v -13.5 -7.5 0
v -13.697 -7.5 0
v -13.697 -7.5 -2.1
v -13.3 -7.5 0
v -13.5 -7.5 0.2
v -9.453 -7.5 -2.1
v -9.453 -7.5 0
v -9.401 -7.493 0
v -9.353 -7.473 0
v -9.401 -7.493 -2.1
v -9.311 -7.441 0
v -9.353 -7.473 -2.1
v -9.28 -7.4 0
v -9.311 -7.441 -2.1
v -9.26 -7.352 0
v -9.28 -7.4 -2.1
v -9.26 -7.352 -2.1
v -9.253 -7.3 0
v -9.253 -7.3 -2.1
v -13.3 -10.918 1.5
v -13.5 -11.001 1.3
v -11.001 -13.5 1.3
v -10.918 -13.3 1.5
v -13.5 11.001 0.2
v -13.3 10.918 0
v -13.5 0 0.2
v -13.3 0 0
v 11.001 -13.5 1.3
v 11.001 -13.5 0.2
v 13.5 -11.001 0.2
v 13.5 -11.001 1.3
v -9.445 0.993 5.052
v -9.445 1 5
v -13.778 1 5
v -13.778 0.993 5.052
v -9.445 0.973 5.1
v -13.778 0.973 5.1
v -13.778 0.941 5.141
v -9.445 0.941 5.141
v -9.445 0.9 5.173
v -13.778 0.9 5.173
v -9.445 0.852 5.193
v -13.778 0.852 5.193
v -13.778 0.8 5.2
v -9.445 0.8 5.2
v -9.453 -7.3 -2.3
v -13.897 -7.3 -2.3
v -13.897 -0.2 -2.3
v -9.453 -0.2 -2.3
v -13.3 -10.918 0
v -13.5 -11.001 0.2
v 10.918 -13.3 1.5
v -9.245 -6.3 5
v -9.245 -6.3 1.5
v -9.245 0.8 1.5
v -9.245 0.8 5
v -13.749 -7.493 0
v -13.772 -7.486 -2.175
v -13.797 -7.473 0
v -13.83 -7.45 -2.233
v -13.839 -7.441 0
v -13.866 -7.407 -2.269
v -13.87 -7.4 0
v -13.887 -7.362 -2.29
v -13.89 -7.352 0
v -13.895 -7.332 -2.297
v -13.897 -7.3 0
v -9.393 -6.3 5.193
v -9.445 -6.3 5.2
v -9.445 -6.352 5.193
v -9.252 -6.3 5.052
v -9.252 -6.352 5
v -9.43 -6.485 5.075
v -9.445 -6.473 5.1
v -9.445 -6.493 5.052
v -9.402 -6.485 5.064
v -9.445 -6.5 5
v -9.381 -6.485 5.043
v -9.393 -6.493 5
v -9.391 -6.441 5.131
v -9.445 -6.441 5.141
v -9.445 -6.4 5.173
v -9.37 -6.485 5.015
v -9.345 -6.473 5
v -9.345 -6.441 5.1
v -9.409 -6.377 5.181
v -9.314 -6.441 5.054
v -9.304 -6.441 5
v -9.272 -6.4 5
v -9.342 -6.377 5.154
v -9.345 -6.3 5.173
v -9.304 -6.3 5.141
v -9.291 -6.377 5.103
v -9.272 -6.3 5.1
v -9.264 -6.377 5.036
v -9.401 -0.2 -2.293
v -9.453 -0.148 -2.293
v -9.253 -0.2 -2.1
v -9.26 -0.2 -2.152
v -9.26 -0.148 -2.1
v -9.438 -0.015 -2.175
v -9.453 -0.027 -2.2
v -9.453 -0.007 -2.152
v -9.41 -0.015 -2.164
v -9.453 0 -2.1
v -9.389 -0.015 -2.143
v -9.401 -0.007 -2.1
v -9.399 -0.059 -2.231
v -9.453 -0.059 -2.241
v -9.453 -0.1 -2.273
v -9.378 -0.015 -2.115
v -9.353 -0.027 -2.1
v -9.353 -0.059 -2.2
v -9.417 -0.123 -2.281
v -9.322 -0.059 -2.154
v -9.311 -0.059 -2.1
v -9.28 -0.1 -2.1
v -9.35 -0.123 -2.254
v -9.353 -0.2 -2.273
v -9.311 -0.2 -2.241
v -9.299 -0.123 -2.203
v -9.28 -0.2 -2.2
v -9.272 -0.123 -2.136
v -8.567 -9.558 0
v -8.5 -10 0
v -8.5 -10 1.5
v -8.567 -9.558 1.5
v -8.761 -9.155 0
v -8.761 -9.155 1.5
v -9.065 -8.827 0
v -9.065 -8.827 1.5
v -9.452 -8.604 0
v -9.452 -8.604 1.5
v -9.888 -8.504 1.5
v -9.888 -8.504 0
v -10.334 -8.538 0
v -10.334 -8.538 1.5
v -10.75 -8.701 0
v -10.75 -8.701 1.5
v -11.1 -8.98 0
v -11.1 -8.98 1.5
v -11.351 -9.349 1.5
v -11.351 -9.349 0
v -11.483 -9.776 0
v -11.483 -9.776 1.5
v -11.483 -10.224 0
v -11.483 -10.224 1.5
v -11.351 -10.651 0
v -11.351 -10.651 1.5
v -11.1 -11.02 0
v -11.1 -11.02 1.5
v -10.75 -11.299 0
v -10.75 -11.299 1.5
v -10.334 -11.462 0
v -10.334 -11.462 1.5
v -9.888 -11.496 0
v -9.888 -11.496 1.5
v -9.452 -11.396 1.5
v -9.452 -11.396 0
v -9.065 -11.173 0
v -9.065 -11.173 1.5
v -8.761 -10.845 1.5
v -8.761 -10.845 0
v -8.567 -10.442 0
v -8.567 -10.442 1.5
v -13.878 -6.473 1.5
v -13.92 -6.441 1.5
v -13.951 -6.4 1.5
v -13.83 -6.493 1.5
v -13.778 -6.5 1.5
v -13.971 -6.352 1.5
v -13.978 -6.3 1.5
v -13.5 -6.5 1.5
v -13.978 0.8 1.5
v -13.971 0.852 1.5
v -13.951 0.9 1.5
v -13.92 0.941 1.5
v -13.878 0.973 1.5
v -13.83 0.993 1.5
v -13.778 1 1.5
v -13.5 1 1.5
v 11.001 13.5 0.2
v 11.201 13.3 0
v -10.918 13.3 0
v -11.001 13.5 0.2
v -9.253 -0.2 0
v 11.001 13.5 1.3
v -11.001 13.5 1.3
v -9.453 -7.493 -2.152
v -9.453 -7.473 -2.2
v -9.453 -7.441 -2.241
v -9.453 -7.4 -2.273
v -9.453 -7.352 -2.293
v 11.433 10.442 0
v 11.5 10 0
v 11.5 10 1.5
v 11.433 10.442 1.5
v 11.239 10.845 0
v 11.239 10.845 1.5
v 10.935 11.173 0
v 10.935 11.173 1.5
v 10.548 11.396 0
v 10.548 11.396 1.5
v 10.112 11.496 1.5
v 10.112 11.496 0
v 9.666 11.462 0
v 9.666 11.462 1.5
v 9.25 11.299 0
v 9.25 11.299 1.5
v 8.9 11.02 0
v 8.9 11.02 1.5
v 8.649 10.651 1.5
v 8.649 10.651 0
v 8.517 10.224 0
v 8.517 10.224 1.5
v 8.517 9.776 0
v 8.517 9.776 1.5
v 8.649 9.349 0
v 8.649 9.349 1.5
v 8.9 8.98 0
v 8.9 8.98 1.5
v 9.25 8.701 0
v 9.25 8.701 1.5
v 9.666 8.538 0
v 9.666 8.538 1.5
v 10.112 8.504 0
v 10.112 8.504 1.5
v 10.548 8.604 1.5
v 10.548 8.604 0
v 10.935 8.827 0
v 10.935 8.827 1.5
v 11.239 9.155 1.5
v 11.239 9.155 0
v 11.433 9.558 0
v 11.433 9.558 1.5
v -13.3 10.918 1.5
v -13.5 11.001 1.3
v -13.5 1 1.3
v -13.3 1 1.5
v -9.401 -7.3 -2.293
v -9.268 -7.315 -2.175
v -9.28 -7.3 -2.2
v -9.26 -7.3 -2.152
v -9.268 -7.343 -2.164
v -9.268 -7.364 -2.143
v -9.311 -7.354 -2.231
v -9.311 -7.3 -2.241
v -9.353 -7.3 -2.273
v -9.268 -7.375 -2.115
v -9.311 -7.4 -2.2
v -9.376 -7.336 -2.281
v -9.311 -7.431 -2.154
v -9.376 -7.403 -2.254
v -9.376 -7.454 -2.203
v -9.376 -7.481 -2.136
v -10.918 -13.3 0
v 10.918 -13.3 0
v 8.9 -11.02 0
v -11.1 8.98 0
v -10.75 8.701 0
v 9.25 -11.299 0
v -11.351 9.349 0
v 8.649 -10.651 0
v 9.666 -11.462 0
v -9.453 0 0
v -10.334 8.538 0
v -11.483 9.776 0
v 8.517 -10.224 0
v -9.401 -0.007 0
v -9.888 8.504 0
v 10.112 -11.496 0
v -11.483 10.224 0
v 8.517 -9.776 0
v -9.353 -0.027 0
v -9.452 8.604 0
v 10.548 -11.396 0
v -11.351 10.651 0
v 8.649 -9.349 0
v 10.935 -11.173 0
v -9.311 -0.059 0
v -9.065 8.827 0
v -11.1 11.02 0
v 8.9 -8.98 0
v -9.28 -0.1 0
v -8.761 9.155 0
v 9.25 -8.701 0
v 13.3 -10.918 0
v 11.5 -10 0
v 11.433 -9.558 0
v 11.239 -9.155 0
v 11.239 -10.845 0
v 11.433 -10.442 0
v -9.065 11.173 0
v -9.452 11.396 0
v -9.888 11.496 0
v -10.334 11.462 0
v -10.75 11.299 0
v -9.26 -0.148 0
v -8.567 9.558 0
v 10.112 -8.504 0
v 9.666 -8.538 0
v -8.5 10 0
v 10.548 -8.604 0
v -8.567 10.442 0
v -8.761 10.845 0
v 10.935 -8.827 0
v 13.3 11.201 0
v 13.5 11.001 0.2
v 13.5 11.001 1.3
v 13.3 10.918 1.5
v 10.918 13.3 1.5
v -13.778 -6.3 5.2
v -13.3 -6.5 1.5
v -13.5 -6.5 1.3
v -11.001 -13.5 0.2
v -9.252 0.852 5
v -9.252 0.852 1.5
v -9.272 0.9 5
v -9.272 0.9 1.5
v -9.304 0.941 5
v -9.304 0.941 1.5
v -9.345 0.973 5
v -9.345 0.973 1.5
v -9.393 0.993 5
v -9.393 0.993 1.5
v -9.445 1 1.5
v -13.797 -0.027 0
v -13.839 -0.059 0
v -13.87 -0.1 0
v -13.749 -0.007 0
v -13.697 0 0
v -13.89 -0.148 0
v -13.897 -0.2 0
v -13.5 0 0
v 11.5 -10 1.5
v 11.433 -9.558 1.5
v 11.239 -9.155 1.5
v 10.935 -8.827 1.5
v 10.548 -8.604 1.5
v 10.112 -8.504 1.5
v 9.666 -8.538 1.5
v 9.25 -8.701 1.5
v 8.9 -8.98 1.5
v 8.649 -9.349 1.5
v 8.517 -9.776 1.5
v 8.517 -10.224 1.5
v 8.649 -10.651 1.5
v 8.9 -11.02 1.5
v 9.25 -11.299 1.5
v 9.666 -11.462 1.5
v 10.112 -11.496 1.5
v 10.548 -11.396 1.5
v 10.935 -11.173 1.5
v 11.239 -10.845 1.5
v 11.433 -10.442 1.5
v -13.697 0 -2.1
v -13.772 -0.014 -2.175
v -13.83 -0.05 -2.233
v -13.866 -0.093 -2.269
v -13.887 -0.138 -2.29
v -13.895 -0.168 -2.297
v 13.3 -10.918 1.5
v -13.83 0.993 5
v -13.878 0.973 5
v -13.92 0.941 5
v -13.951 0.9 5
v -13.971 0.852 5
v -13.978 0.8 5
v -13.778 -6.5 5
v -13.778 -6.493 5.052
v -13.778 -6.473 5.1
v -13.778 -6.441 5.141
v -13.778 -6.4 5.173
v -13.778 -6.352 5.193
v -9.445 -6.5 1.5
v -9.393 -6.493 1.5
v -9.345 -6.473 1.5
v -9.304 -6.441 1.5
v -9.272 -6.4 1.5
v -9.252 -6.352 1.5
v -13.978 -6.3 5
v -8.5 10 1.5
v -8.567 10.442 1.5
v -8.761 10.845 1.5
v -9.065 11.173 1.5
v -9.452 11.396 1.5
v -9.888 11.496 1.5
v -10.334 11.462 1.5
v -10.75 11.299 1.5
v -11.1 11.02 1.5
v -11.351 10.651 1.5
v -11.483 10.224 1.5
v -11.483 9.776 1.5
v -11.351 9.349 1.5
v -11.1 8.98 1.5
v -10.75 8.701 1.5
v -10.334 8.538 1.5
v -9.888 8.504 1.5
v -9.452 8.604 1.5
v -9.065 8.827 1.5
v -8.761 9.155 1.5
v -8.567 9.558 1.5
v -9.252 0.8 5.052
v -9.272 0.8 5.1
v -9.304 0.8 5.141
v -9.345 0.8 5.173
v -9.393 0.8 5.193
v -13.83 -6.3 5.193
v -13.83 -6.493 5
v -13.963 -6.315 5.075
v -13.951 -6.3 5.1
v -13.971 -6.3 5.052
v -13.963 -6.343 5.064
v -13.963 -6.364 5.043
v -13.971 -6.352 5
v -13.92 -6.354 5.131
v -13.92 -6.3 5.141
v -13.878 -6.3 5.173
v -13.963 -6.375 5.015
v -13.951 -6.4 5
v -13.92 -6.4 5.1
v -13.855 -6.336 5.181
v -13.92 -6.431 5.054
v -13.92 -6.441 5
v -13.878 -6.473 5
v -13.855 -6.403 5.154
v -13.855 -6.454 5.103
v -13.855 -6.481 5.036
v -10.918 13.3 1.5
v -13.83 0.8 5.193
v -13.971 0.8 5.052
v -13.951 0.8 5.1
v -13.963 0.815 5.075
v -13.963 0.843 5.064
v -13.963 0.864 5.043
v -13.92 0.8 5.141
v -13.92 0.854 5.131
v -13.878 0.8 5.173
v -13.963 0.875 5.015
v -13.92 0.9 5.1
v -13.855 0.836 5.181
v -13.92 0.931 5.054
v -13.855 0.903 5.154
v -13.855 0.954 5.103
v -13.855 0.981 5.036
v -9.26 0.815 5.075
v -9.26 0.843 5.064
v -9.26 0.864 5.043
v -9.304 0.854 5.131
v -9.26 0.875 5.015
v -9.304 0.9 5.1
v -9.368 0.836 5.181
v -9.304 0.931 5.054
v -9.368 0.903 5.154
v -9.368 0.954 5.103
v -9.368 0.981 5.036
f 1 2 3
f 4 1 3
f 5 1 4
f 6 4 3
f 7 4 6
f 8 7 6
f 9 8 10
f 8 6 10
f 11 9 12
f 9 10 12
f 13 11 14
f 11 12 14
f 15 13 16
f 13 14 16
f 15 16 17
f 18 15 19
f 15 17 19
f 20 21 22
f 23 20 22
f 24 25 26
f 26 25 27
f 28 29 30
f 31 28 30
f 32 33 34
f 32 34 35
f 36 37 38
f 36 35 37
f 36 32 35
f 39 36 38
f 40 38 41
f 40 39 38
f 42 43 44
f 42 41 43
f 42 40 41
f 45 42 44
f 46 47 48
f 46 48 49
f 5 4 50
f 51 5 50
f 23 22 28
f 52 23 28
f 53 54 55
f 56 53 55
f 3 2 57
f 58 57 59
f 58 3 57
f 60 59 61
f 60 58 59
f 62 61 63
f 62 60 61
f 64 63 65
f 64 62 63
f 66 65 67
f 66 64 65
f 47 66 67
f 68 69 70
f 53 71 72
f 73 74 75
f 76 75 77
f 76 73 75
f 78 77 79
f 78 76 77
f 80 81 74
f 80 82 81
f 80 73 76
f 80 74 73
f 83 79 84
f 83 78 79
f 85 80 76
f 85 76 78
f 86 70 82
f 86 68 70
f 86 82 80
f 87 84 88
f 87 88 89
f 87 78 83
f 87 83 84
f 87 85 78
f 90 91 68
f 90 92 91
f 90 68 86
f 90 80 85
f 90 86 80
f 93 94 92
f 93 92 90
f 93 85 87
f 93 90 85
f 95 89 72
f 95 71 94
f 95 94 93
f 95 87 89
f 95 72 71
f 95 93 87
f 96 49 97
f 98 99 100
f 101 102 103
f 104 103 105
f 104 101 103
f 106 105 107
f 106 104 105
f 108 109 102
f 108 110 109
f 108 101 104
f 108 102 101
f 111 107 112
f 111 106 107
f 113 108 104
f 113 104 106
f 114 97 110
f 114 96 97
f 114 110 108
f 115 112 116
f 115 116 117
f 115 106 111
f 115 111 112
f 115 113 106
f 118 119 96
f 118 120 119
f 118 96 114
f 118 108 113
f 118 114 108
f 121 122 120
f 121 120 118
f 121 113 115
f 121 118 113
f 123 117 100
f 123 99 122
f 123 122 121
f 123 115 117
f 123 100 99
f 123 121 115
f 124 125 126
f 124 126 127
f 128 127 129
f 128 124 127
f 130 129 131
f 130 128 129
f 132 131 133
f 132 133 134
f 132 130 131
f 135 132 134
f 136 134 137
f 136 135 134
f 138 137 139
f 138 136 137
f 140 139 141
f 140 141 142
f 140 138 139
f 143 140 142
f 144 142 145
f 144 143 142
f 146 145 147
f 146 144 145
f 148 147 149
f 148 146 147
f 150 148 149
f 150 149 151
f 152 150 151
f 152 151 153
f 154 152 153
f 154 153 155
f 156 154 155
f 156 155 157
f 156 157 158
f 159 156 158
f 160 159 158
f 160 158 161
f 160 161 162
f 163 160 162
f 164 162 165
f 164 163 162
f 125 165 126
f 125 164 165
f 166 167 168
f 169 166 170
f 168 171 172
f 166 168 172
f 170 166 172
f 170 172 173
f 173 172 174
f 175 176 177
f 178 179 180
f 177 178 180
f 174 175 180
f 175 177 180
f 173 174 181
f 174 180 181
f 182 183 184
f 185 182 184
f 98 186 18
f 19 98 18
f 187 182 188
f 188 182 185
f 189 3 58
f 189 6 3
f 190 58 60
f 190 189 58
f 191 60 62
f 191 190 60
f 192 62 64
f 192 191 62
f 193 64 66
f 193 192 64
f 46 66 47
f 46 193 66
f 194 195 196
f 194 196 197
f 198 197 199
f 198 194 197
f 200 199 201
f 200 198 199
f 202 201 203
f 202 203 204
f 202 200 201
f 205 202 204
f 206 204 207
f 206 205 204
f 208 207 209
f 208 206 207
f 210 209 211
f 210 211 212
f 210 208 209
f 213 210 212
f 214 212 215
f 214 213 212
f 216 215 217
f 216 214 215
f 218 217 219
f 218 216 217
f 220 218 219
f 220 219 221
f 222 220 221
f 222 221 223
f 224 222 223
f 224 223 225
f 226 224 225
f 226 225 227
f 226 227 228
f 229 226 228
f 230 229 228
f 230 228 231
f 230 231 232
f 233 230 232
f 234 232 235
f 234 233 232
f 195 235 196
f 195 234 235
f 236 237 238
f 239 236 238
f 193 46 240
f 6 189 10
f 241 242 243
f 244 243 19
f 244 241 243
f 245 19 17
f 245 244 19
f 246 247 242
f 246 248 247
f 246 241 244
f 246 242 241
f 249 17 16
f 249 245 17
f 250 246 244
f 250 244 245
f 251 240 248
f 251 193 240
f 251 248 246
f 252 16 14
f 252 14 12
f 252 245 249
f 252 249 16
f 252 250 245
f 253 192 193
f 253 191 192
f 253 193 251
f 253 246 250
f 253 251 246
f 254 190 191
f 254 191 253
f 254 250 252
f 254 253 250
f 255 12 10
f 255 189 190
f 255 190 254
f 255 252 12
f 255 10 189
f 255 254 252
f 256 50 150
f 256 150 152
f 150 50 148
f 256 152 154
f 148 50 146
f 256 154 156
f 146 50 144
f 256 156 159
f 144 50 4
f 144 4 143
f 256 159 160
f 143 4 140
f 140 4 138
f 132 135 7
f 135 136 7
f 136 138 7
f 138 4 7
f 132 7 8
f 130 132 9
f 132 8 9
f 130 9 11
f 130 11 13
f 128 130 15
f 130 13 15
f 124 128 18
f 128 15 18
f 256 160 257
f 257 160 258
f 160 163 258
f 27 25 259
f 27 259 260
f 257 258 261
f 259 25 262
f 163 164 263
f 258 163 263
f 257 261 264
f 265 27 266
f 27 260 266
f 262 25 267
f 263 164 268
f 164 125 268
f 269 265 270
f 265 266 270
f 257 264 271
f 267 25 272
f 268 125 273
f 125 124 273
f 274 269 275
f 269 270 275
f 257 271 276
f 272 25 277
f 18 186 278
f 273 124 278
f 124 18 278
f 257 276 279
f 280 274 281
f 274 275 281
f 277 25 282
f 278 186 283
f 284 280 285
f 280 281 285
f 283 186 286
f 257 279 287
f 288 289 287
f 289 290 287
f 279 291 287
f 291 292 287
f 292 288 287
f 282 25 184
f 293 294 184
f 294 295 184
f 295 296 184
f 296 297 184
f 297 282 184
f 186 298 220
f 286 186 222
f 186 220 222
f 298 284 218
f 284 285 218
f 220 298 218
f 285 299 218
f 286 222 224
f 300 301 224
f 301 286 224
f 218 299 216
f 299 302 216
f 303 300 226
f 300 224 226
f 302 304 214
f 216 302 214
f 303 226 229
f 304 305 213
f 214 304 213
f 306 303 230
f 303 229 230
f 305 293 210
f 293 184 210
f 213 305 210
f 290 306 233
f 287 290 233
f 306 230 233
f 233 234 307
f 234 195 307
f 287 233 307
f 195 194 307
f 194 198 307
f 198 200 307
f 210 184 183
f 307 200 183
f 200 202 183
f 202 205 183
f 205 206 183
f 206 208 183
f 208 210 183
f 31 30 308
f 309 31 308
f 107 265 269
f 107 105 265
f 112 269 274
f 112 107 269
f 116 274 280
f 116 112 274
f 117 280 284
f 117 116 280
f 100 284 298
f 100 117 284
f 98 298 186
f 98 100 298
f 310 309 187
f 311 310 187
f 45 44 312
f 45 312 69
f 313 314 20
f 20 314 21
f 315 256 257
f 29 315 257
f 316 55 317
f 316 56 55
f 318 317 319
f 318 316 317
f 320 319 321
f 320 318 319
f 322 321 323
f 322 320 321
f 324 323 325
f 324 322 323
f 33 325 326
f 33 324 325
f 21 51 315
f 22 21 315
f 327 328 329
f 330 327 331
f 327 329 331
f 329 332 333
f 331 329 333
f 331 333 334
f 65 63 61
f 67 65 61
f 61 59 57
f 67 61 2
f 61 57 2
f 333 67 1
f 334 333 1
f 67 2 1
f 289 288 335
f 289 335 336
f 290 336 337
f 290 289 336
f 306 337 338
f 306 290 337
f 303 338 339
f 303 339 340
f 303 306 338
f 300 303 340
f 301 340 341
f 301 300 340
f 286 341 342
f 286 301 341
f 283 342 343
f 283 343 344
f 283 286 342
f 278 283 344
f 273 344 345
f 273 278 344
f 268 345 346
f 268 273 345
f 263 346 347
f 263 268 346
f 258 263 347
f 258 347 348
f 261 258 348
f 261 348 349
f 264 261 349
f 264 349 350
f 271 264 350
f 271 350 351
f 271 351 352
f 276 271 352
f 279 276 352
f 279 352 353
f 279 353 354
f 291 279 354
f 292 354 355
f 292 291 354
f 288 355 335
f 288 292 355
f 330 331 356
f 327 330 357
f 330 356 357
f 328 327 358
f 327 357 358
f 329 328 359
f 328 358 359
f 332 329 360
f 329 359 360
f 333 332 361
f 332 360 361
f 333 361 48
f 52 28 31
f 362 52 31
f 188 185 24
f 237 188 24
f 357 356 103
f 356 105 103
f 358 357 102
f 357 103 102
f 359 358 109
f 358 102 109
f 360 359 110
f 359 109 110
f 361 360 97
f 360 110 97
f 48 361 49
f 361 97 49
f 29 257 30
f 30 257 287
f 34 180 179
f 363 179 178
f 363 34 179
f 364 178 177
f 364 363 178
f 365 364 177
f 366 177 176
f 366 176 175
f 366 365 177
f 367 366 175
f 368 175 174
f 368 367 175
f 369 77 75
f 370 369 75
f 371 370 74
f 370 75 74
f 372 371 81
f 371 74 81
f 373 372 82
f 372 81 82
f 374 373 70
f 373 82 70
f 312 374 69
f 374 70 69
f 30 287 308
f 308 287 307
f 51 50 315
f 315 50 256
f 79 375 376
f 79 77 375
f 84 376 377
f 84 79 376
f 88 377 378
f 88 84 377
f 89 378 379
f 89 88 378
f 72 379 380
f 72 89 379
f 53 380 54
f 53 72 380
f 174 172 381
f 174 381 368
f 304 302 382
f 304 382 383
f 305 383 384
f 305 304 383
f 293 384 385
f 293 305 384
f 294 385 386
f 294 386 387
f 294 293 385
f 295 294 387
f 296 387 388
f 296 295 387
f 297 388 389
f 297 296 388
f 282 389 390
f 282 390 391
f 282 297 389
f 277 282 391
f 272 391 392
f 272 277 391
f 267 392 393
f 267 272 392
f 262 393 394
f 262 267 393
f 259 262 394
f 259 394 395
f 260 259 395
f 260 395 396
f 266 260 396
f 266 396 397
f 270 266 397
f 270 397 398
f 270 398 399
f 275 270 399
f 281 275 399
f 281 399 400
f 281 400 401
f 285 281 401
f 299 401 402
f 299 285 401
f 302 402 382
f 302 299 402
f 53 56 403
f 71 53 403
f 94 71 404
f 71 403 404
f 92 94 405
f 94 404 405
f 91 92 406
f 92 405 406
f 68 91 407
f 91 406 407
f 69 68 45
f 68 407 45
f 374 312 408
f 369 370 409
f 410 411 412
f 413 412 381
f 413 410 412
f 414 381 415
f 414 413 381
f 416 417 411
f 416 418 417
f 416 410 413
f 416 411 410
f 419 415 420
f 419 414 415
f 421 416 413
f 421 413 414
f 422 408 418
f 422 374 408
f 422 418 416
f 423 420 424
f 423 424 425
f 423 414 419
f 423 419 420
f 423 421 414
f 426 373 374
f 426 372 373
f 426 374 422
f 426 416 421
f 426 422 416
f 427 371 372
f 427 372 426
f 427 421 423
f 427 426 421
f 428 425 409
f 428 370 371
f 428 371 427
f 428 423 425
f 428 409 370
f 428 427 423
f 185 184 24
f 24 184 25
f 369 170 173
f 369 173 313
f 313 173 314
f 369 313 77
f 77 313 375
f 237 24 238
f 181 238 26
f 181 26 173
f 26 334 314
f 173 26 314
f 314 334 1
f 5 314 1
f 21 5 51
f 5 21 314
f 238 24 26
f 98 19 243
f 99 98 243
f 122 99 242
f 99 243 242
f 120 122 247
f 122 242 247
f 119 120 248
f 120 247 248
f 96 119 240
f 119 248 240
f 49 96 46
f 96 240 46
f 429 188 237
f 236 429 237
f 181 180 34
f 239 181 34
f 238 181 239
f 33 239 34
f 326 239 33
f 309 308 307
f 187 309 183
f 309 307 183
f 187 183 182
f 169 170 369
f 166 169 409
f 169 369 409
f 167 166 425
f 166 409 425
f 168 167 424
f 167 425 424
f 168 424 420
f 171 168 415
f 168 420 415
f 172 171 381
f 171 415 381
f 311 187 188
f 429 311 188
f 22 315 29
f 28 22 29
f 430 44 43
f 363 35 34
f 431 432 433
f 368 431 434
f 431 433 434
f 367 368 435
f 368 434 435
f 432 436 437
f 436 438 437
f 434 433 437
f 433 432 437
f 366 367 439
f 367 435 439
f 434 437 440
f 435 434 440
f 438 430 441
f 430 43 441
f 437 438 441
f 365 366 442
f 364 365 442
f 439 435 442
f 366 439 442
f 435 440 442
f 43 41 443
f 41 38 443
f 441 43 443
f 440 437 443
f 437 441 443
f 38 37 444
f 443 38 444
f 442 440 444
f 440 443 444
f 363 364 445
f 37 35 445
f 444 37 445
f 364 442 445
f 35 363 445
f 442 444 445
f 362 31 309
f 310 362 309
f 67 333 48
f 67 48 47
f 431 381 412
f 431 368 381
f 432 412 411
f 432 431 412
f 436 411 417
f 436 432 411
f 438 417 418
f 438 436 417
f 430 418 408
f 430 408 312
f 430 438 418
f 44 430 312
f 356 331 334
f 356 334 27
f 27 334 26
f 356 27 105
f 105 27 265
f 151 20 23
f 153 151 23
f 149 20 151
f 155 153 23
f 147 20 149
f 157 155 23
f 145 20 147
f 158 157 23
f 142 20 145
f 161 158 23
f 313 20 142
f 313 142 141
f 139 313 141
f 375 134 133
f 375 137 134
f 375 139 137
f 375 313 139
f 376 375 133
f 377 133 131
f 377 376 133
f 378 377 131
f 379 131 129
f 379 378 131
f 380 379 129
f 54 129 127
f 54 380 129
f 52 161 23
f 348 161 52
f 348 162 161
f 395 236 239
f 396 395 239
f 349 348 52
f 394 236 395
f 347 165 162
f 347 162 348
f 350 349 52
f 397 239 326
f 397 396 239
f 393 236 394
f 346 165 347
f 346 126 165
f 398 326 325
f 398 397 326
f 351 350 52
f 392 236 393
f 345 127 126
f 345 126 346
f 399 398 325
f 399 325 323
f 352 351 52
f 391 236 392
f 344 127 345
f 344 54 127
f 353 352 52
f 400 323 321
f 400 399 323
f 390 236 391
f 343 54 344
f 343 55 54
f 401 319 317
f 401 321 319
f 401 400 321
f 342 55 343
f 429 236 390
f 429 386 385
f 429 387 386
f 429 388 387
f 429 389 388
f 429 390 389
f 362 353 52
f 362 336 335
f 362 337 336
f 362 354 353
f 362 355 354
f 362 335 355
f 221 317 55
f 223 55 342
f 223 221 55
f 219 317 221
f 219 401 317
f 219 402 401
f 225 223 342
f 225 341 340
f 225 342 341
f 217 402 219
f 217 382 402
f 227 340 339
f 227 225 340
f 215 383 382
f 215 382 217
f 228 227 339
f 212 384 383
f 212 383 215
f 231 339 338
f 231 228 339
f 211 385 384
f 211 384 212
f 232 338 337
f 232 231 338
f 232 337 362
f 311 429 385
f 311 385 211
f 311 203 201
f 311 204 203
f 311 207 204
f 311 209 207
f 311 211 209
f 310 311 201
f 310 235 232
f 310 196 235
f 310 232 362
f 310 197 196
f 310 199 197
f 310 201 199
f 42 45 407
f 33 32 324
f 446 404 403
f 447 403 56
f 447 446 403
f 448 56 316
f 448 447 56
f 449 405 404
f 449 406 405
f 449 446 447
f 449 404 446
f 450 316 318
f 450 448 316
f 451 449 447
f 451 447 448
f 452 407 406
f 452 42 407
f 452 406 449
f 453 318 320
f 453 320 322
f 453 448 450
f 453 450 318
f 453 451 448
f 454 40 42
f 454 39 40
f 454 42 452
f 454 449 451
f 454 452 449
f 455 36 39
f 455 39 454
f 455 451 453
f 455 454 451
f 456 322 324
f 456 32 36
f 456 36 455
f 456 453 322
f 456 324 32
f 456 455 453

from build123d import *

# Parameters (mm, degrees)
F0_R     = 1.5
F1_DEPTH = 1.5
F2_W     = 4.733152427
F2_H     = 7.5
F3_DEPTH = 3.7
F4_W     = 4.6442656718
F4_H     = 7.5
F5_DEPTH = 2.3
F6_R     = 0.2
F7_SIZE  = 0.2
F8_R     = 0.2


with BuildPart() as f1:
    # F0 (on Top) → F1 (new body)
    with BuildSketch(Plane.XY):
        Polygon((11.0012499681, 13.5), (-11.0012499681, 13.5), (-13.5, 11.0012499681), (-13.5, -11.0012499681), (-11.0012499681, -13.5), (11.0012499681, -13.5), (13.5, -11.0012499681), (13.5, 11.0012499681), align=None)
        with Locations((-10, -10)):
            Circle(F0_R, mode=Mode.SUBTRACT)
        with Locations((10, -10)):
            Circle(F0_R, mode=Mode.SUBTRACT)
        with Locations((-10, 10)):
            Circle(F0_R, mode=Mode.SUBTRACT)
        with Locations((10, 10)):
            Circle(F0_R, mode=Mode.SUBTRACT)
    extrude(amount=F1_DEPTH)

    # F2 (on face) → F3 (join)
    with BuildSketch(Plane.XY.offset(1.5)):
        with Locations((-11.6115645505, -2.75)):
            Rectangle(F2_W, F2_H)
    extrude(amount=F3_DEPTH)

    # F4 (on face) → F5 (join)
    with BuildSketch(Plane(origin=(0, 0, 0), x_dir=(1, 0, 0), z_dir=(0, 0, -1))):
        with Locations((-11.5750247117, 3.75)):
            Rectangle(F4_W, F4_H)
    extrude(amount=F5_DEPTH)

    # F6
    f6_edges = [f1.edges().sort_by_distance(p)[0] for p in [
        (-11.611565, 1, 5.2),
        (-9.244988, -2.75, 5.2),
        (-11.611565, -6.5, 5.2),
        (-9.244988, -6.5, 3.35),
        (-9.244988, 1, 3.35),
        (-13.978141, -2.75, 5.2),
        (-13.978141, -6.5, 3.35),
        (-13.978141, 1, 3.35),
    ]]
    fillet(f6_edges, radius=F6_R)

    # F7
    f7_edges = [f1.edges().sort_by_distance(p)[0] for p in [
        (0, -13.5, 1.5),
        (-12.250625, -12.250625, 1.5),
        (-13.5, -8.750625, 1.5),
        (12.250625, -12.250625, 1.5),
        (13.5, 0, 1.5),
        (-13.5, 6.000625, 1.5),
        (-12.250625, 12.250625, 1.5),
        (0, 13.5, 1.5),
        (12.250625, 12.250625, 1.5),
        (13.5, 0, 0),
        (0, 13.5, 0),
        (-12.250625, 12.250625, 0),
        (-13.5, 5.500625, 0),
        (-13.5, -9.250625, 0),
        (-12.250625, -12.250625, 0),
        (0, -13.5, 0),
        (12.250625, -12.250625, 0),
    ]]
    chamfer(f7_edges, length=F7_SIZE)

    # F8
    f8_edges = [f1.edges().sort_by_distance(p)[0] for p in [
        (-11.575025, -7.5, -2.3),
        (-9.252892, -3.75, -2.3),
        (-11.575025, 0, -2.3),
        (-13.897158, 0, -1.15),
        (-13.897158, -7.5, -1.15),
        (-9.252892, -7.5, -1.15),
        (-9.252892, 0, -1.15),
    ]]
    fillet(f8_edges, radius=F8_R)


solid = f1.part
